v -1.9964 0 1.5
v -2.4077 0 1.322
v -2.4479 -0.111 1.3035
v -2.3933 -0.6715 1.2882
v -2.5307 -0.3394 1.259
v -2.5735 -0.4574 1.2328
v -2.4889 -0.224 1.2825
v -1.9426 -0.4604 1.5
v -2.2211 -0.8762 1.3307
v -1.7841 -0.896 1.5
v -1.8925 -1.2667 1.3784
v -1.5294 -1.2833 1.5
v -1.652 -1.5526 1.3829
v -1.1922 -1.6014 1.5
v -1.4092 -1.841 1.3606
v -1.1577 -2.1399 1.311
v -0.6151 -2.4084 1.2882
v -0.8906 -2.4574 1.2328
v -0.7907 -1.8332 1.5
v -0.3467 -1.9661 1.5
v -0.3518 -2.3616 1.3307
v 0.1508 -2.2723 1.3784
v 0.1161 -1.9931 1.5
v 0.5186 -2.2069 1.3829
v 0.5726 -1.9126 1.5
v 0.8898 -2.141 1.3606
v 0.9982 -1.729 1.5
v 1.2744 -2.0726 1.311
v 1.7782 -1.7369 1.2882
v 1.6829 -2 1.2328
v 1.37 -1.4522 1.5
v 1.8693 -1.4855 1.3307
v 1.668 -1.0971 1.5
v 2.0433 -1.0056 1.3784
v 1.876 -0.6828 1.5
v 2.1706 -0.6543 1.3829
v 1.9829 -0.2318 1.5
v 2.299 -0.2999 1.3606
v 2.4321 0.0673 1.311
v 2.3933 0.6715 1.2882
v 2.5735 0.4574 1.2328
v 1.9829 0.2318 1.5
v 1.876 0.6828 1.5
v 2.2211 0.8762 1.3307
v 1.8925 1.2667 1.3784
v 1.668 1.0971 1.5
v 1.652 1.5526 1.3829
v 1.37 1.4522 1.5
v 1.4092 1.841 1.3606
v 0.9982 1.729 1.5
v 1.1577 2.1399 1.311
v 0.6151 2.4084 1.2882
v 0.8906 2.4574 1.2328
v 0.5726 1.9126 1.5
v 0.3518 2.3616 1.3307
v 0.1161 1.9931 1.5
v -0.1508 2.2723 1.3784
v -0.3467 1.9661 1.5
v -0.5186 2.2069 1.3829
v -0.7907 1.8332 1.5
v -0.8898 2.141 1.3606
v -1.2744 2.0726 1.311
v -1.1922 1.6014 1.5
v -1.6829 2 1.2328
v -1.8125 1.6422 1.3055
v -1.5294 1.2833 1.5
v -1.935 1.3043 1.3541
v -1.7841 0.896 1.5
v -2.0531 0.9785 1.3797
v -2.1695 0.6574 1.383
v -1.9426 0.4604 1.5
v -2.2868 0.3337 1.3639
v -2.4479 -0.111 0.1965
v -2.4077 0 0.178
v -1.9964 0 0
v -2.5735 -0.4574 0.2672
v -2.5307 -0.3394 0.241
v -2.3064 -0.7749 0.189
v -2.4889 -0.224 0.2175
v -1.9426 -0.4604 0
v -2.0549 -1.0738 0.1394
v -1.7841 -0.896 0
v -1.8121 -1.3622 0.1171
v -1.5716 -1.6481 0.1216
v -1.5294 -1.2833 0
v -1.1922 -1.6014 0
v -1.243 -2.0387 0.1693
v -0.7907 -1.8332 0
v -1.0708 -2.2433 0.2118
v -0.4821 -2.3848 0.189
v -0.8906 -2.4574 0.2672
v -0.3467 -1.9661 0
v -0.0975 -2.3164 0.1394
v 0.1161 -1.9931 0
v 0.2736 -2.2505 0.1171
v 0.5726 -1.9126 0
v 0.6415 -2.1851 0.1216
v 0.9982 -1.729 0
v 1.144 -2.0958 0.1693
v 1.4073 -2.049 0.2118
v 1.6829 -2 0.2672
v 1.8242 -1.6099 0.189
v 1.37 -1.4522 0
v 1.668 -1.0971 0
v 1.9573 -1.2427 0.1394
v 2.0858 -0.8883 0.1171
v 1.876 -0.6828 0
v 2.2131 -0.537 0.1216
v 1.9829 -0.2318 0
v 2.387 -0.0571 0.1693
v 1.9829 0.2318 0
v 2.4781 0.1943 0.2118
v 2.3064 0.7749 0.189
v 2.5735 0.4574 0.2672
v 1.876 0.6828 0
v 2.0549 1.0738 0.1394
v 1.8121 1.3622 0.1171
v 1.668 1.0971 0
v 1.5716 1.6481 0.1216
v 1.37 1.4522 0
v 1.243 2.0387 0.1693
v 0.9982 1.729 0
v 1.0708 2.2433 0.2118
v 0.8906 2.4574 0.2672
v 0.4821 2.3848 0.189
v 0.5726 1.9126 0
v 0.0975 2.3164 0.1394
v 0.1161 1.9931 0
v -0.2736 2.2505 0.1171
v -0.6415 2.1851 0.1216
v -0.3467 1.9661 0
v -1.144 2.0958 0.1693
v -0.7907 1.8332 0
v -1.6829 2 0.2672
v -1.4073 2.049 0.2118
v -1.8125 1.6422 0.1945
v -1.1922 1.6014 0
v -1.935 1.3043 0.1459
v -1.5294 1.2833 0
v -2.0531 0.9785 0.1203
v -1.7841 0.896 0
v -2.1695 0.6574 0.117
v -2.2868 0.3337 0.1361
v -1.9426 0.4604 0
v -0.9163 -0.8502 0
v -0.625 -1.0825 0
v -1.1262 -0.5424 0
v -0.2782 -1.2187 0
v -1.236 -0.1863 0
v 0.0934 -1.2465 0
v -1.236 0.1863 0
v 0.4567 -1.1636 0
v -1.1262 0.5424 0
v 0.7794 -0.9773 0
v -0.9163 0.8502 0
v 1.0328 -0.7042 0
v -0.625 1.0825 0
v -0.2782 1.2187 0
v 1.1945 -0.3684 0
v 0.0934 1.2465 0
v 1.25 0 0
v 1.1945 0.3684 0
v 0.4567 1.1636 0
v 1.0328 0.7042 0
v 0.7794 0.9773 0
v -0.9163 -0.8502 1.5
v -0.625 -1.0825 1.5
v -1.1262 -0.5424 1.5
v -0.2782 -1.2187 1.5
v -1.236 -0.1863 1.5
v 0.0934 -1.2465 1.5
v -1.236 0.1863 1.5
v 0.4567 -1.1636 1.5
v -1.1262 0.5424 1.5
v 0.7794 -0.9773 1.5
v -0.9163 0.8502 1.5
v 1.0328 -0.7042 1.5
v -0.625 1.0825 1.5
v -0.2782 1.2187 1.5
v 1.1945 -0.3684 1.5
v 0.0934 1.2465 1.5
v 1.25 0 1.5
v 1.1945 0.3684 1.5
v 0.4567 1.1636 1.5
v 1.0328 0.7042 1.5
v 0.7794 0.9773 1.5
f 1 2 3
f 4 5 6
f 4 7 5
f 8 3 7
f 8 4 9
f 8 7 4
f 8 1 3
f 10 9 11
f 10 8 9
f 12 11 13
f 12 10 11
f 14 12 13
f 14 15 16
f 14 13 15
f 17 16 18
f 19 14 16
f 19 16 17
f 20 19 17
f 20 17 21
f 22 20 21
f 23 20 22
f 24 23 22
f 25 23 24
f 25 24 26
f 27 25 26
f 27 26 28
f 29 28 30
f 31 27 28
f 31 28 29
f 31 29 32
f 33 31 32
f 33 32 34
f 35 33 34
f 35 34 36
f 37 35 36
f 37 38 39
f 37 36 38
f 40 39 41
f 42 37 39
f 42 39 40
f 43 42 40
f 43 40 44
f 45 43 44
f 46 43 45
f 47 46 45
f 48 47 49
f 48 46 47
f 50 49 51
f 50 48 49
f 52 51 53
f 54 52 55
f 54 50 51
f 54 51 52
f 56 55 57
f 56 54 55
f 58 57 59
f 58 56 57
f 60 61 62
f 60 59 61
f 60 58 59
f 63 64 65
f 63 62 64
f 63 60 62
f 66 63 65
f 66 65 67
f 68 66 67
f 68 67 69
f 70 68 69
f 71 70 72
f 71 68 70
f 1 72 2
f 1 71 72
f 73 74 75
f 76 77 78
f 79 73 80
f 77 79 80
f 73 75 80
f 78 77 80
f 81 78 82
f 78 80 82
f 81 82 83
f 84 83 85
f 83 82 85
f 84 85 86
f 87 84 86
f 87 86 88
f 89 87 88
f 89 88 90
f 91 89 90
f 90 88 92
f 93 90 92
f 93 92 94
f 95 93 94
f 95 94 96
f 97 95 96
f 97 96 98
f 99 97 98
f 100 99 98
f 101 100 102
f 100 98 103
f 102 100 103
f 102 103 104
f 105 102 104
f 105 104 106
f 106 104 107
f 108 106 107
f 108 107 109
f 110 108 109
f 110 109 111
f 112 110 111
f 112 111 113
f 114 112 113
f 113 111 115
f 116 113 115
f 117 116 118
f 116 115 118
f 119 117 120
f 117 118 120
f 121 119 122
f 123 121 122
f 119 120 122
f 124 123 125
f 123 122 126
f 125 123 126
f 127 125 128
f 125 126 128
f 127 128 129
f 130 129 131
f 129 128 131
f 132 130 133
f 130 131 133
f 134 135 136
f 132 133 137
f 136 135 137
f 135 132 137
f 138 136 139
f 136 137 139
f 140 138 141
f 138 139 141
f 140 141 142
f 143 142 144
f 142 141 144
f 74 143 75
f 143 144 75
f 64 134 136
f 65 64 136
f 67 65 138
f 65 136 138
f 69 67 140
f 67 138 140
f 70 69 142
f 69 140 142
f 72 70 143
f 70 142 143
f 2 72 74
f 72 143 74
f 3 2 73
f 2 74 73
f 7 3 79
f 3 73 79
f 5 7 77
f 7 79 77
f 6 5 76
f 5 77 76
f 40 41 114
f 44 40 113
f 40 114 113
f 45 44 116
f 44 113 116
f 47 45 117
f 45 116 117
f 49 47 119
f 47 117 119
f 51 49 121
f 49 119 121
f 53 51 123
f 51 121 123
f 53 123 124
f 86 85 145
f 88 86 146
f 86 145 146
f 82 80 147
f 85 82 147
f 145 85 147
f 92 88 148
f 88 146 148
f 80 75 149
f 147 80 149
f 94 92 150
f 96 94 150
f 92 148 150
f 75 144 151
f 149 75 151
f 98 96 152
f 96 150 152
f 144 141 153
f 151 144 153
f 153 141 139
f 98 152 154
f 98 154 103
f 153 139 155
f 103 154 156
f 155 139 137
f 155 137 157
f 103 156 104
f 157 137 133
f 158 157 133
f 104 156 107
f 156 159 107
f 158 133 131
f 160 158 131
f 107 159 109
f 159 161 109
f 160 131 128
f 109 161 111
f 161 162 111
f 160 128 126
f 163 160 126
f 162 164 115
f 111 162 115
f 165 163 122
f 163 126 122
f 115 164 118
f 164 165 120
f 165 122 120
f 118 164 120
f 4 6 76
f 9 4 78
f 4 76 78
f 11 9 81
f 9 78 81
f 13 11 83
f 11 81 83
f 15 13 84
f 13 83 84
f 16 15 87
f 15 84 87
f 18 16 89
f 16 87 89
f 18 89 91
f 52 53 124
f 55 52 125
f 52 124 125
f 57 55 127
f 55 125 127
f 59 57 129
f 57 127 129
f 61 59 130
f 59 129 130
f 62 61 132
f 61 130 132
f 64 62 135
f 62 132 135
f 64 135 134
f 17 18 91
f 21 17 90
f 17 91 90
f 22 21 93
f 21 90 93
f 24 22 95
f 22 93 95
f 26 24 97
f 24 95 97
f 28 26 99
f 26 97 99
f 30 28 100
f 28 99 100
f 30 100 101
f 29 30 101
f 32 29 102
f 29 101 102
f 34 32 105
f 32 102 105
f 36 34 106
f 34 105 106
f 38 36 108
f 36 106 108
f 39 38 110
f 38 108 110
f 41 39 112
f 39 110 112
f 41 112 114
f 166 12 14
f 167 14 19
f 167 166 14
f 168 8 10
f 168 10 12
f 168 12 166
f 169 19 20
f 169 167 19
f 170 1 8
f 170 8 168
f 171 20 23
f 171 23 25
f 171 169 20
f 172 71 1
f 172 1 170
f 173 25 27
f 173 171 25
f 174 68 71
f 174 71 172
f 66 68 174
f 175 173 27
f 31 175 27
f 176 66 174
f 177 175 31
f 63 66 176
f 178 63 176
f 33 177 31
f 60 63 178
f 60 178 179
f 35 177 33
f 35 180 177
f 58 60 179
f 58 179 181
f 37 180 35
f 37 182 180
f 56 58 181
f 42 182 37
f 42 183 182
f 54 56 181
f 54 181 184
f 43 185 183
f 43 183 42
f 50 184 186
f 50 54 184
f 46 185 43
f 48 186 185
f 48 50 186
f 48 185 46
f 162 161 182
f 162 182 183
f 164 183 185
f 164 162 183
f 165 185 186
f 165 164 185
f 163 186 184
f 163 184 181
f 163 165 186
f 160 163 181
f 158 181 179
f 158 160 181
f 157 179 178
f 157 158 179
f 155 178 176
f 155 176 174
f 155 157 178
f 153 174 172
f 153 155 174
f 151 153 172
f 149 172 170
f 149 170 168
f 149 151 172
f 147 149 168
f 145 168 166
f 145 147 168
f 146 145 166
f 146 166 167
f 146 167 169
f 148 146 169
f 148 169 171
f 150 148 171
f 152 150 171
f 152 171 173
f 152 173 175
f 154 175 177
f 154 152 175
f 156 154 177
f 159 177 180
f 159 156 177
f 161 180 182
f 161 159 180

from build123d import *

# Parameters (mm, degrees)
SKETCH_1_R      = 1.25
EXTRUDE_1_DEPTH = 1.5


with BuildPart() as part:
    # 草图1 → 凸台-拉伸1 (new body)
    with BuildSketch(Plane.XY):
        Polygon((-0.890615534, -2.457408644), (1.682870546, -2), (2.573486081, 0.457408644), (0.890615534, 2.457408644), (-1.682870546, 2), (-2.573486081, -0.457408644), align=None)
        Circle(SKETCH_1_R, mode=Mode.SUBTRACT)
    extrude(amount=EXTRUDE_1_DEPTH)

    # 草图3 → 切除-旋转1 (revolve, cut)
    with BuildSketch(Plane(origin=(0, 0, 0), x_dir=(1, 0, 0), z_dir=(0, 1, 0)), mode=Mode.PRIVATE) as cut_revolve_1_sk:
        Polygon((1.996433862, -1.5), (2.573486081, -1.5), (2.704394407, -1.5), (2.704394407, -1.193613078), align=None)
    cut_revolve_1 = revolve(cut_revolve_1_sk.sketch.rotate(Axis((0, 0, 0), (0, 0, 1)), 180), axis=Axis((0, 0, 0), (0, 0, 1)), mode=Mode.SUBTRACT)

    # 镜向1: 切除-旋转1 across plane
    add(cut_revolve_1.mirror(Plane.XY.offset(0.75)), mode=Mode.SUBTRACT)


solid = part.part
